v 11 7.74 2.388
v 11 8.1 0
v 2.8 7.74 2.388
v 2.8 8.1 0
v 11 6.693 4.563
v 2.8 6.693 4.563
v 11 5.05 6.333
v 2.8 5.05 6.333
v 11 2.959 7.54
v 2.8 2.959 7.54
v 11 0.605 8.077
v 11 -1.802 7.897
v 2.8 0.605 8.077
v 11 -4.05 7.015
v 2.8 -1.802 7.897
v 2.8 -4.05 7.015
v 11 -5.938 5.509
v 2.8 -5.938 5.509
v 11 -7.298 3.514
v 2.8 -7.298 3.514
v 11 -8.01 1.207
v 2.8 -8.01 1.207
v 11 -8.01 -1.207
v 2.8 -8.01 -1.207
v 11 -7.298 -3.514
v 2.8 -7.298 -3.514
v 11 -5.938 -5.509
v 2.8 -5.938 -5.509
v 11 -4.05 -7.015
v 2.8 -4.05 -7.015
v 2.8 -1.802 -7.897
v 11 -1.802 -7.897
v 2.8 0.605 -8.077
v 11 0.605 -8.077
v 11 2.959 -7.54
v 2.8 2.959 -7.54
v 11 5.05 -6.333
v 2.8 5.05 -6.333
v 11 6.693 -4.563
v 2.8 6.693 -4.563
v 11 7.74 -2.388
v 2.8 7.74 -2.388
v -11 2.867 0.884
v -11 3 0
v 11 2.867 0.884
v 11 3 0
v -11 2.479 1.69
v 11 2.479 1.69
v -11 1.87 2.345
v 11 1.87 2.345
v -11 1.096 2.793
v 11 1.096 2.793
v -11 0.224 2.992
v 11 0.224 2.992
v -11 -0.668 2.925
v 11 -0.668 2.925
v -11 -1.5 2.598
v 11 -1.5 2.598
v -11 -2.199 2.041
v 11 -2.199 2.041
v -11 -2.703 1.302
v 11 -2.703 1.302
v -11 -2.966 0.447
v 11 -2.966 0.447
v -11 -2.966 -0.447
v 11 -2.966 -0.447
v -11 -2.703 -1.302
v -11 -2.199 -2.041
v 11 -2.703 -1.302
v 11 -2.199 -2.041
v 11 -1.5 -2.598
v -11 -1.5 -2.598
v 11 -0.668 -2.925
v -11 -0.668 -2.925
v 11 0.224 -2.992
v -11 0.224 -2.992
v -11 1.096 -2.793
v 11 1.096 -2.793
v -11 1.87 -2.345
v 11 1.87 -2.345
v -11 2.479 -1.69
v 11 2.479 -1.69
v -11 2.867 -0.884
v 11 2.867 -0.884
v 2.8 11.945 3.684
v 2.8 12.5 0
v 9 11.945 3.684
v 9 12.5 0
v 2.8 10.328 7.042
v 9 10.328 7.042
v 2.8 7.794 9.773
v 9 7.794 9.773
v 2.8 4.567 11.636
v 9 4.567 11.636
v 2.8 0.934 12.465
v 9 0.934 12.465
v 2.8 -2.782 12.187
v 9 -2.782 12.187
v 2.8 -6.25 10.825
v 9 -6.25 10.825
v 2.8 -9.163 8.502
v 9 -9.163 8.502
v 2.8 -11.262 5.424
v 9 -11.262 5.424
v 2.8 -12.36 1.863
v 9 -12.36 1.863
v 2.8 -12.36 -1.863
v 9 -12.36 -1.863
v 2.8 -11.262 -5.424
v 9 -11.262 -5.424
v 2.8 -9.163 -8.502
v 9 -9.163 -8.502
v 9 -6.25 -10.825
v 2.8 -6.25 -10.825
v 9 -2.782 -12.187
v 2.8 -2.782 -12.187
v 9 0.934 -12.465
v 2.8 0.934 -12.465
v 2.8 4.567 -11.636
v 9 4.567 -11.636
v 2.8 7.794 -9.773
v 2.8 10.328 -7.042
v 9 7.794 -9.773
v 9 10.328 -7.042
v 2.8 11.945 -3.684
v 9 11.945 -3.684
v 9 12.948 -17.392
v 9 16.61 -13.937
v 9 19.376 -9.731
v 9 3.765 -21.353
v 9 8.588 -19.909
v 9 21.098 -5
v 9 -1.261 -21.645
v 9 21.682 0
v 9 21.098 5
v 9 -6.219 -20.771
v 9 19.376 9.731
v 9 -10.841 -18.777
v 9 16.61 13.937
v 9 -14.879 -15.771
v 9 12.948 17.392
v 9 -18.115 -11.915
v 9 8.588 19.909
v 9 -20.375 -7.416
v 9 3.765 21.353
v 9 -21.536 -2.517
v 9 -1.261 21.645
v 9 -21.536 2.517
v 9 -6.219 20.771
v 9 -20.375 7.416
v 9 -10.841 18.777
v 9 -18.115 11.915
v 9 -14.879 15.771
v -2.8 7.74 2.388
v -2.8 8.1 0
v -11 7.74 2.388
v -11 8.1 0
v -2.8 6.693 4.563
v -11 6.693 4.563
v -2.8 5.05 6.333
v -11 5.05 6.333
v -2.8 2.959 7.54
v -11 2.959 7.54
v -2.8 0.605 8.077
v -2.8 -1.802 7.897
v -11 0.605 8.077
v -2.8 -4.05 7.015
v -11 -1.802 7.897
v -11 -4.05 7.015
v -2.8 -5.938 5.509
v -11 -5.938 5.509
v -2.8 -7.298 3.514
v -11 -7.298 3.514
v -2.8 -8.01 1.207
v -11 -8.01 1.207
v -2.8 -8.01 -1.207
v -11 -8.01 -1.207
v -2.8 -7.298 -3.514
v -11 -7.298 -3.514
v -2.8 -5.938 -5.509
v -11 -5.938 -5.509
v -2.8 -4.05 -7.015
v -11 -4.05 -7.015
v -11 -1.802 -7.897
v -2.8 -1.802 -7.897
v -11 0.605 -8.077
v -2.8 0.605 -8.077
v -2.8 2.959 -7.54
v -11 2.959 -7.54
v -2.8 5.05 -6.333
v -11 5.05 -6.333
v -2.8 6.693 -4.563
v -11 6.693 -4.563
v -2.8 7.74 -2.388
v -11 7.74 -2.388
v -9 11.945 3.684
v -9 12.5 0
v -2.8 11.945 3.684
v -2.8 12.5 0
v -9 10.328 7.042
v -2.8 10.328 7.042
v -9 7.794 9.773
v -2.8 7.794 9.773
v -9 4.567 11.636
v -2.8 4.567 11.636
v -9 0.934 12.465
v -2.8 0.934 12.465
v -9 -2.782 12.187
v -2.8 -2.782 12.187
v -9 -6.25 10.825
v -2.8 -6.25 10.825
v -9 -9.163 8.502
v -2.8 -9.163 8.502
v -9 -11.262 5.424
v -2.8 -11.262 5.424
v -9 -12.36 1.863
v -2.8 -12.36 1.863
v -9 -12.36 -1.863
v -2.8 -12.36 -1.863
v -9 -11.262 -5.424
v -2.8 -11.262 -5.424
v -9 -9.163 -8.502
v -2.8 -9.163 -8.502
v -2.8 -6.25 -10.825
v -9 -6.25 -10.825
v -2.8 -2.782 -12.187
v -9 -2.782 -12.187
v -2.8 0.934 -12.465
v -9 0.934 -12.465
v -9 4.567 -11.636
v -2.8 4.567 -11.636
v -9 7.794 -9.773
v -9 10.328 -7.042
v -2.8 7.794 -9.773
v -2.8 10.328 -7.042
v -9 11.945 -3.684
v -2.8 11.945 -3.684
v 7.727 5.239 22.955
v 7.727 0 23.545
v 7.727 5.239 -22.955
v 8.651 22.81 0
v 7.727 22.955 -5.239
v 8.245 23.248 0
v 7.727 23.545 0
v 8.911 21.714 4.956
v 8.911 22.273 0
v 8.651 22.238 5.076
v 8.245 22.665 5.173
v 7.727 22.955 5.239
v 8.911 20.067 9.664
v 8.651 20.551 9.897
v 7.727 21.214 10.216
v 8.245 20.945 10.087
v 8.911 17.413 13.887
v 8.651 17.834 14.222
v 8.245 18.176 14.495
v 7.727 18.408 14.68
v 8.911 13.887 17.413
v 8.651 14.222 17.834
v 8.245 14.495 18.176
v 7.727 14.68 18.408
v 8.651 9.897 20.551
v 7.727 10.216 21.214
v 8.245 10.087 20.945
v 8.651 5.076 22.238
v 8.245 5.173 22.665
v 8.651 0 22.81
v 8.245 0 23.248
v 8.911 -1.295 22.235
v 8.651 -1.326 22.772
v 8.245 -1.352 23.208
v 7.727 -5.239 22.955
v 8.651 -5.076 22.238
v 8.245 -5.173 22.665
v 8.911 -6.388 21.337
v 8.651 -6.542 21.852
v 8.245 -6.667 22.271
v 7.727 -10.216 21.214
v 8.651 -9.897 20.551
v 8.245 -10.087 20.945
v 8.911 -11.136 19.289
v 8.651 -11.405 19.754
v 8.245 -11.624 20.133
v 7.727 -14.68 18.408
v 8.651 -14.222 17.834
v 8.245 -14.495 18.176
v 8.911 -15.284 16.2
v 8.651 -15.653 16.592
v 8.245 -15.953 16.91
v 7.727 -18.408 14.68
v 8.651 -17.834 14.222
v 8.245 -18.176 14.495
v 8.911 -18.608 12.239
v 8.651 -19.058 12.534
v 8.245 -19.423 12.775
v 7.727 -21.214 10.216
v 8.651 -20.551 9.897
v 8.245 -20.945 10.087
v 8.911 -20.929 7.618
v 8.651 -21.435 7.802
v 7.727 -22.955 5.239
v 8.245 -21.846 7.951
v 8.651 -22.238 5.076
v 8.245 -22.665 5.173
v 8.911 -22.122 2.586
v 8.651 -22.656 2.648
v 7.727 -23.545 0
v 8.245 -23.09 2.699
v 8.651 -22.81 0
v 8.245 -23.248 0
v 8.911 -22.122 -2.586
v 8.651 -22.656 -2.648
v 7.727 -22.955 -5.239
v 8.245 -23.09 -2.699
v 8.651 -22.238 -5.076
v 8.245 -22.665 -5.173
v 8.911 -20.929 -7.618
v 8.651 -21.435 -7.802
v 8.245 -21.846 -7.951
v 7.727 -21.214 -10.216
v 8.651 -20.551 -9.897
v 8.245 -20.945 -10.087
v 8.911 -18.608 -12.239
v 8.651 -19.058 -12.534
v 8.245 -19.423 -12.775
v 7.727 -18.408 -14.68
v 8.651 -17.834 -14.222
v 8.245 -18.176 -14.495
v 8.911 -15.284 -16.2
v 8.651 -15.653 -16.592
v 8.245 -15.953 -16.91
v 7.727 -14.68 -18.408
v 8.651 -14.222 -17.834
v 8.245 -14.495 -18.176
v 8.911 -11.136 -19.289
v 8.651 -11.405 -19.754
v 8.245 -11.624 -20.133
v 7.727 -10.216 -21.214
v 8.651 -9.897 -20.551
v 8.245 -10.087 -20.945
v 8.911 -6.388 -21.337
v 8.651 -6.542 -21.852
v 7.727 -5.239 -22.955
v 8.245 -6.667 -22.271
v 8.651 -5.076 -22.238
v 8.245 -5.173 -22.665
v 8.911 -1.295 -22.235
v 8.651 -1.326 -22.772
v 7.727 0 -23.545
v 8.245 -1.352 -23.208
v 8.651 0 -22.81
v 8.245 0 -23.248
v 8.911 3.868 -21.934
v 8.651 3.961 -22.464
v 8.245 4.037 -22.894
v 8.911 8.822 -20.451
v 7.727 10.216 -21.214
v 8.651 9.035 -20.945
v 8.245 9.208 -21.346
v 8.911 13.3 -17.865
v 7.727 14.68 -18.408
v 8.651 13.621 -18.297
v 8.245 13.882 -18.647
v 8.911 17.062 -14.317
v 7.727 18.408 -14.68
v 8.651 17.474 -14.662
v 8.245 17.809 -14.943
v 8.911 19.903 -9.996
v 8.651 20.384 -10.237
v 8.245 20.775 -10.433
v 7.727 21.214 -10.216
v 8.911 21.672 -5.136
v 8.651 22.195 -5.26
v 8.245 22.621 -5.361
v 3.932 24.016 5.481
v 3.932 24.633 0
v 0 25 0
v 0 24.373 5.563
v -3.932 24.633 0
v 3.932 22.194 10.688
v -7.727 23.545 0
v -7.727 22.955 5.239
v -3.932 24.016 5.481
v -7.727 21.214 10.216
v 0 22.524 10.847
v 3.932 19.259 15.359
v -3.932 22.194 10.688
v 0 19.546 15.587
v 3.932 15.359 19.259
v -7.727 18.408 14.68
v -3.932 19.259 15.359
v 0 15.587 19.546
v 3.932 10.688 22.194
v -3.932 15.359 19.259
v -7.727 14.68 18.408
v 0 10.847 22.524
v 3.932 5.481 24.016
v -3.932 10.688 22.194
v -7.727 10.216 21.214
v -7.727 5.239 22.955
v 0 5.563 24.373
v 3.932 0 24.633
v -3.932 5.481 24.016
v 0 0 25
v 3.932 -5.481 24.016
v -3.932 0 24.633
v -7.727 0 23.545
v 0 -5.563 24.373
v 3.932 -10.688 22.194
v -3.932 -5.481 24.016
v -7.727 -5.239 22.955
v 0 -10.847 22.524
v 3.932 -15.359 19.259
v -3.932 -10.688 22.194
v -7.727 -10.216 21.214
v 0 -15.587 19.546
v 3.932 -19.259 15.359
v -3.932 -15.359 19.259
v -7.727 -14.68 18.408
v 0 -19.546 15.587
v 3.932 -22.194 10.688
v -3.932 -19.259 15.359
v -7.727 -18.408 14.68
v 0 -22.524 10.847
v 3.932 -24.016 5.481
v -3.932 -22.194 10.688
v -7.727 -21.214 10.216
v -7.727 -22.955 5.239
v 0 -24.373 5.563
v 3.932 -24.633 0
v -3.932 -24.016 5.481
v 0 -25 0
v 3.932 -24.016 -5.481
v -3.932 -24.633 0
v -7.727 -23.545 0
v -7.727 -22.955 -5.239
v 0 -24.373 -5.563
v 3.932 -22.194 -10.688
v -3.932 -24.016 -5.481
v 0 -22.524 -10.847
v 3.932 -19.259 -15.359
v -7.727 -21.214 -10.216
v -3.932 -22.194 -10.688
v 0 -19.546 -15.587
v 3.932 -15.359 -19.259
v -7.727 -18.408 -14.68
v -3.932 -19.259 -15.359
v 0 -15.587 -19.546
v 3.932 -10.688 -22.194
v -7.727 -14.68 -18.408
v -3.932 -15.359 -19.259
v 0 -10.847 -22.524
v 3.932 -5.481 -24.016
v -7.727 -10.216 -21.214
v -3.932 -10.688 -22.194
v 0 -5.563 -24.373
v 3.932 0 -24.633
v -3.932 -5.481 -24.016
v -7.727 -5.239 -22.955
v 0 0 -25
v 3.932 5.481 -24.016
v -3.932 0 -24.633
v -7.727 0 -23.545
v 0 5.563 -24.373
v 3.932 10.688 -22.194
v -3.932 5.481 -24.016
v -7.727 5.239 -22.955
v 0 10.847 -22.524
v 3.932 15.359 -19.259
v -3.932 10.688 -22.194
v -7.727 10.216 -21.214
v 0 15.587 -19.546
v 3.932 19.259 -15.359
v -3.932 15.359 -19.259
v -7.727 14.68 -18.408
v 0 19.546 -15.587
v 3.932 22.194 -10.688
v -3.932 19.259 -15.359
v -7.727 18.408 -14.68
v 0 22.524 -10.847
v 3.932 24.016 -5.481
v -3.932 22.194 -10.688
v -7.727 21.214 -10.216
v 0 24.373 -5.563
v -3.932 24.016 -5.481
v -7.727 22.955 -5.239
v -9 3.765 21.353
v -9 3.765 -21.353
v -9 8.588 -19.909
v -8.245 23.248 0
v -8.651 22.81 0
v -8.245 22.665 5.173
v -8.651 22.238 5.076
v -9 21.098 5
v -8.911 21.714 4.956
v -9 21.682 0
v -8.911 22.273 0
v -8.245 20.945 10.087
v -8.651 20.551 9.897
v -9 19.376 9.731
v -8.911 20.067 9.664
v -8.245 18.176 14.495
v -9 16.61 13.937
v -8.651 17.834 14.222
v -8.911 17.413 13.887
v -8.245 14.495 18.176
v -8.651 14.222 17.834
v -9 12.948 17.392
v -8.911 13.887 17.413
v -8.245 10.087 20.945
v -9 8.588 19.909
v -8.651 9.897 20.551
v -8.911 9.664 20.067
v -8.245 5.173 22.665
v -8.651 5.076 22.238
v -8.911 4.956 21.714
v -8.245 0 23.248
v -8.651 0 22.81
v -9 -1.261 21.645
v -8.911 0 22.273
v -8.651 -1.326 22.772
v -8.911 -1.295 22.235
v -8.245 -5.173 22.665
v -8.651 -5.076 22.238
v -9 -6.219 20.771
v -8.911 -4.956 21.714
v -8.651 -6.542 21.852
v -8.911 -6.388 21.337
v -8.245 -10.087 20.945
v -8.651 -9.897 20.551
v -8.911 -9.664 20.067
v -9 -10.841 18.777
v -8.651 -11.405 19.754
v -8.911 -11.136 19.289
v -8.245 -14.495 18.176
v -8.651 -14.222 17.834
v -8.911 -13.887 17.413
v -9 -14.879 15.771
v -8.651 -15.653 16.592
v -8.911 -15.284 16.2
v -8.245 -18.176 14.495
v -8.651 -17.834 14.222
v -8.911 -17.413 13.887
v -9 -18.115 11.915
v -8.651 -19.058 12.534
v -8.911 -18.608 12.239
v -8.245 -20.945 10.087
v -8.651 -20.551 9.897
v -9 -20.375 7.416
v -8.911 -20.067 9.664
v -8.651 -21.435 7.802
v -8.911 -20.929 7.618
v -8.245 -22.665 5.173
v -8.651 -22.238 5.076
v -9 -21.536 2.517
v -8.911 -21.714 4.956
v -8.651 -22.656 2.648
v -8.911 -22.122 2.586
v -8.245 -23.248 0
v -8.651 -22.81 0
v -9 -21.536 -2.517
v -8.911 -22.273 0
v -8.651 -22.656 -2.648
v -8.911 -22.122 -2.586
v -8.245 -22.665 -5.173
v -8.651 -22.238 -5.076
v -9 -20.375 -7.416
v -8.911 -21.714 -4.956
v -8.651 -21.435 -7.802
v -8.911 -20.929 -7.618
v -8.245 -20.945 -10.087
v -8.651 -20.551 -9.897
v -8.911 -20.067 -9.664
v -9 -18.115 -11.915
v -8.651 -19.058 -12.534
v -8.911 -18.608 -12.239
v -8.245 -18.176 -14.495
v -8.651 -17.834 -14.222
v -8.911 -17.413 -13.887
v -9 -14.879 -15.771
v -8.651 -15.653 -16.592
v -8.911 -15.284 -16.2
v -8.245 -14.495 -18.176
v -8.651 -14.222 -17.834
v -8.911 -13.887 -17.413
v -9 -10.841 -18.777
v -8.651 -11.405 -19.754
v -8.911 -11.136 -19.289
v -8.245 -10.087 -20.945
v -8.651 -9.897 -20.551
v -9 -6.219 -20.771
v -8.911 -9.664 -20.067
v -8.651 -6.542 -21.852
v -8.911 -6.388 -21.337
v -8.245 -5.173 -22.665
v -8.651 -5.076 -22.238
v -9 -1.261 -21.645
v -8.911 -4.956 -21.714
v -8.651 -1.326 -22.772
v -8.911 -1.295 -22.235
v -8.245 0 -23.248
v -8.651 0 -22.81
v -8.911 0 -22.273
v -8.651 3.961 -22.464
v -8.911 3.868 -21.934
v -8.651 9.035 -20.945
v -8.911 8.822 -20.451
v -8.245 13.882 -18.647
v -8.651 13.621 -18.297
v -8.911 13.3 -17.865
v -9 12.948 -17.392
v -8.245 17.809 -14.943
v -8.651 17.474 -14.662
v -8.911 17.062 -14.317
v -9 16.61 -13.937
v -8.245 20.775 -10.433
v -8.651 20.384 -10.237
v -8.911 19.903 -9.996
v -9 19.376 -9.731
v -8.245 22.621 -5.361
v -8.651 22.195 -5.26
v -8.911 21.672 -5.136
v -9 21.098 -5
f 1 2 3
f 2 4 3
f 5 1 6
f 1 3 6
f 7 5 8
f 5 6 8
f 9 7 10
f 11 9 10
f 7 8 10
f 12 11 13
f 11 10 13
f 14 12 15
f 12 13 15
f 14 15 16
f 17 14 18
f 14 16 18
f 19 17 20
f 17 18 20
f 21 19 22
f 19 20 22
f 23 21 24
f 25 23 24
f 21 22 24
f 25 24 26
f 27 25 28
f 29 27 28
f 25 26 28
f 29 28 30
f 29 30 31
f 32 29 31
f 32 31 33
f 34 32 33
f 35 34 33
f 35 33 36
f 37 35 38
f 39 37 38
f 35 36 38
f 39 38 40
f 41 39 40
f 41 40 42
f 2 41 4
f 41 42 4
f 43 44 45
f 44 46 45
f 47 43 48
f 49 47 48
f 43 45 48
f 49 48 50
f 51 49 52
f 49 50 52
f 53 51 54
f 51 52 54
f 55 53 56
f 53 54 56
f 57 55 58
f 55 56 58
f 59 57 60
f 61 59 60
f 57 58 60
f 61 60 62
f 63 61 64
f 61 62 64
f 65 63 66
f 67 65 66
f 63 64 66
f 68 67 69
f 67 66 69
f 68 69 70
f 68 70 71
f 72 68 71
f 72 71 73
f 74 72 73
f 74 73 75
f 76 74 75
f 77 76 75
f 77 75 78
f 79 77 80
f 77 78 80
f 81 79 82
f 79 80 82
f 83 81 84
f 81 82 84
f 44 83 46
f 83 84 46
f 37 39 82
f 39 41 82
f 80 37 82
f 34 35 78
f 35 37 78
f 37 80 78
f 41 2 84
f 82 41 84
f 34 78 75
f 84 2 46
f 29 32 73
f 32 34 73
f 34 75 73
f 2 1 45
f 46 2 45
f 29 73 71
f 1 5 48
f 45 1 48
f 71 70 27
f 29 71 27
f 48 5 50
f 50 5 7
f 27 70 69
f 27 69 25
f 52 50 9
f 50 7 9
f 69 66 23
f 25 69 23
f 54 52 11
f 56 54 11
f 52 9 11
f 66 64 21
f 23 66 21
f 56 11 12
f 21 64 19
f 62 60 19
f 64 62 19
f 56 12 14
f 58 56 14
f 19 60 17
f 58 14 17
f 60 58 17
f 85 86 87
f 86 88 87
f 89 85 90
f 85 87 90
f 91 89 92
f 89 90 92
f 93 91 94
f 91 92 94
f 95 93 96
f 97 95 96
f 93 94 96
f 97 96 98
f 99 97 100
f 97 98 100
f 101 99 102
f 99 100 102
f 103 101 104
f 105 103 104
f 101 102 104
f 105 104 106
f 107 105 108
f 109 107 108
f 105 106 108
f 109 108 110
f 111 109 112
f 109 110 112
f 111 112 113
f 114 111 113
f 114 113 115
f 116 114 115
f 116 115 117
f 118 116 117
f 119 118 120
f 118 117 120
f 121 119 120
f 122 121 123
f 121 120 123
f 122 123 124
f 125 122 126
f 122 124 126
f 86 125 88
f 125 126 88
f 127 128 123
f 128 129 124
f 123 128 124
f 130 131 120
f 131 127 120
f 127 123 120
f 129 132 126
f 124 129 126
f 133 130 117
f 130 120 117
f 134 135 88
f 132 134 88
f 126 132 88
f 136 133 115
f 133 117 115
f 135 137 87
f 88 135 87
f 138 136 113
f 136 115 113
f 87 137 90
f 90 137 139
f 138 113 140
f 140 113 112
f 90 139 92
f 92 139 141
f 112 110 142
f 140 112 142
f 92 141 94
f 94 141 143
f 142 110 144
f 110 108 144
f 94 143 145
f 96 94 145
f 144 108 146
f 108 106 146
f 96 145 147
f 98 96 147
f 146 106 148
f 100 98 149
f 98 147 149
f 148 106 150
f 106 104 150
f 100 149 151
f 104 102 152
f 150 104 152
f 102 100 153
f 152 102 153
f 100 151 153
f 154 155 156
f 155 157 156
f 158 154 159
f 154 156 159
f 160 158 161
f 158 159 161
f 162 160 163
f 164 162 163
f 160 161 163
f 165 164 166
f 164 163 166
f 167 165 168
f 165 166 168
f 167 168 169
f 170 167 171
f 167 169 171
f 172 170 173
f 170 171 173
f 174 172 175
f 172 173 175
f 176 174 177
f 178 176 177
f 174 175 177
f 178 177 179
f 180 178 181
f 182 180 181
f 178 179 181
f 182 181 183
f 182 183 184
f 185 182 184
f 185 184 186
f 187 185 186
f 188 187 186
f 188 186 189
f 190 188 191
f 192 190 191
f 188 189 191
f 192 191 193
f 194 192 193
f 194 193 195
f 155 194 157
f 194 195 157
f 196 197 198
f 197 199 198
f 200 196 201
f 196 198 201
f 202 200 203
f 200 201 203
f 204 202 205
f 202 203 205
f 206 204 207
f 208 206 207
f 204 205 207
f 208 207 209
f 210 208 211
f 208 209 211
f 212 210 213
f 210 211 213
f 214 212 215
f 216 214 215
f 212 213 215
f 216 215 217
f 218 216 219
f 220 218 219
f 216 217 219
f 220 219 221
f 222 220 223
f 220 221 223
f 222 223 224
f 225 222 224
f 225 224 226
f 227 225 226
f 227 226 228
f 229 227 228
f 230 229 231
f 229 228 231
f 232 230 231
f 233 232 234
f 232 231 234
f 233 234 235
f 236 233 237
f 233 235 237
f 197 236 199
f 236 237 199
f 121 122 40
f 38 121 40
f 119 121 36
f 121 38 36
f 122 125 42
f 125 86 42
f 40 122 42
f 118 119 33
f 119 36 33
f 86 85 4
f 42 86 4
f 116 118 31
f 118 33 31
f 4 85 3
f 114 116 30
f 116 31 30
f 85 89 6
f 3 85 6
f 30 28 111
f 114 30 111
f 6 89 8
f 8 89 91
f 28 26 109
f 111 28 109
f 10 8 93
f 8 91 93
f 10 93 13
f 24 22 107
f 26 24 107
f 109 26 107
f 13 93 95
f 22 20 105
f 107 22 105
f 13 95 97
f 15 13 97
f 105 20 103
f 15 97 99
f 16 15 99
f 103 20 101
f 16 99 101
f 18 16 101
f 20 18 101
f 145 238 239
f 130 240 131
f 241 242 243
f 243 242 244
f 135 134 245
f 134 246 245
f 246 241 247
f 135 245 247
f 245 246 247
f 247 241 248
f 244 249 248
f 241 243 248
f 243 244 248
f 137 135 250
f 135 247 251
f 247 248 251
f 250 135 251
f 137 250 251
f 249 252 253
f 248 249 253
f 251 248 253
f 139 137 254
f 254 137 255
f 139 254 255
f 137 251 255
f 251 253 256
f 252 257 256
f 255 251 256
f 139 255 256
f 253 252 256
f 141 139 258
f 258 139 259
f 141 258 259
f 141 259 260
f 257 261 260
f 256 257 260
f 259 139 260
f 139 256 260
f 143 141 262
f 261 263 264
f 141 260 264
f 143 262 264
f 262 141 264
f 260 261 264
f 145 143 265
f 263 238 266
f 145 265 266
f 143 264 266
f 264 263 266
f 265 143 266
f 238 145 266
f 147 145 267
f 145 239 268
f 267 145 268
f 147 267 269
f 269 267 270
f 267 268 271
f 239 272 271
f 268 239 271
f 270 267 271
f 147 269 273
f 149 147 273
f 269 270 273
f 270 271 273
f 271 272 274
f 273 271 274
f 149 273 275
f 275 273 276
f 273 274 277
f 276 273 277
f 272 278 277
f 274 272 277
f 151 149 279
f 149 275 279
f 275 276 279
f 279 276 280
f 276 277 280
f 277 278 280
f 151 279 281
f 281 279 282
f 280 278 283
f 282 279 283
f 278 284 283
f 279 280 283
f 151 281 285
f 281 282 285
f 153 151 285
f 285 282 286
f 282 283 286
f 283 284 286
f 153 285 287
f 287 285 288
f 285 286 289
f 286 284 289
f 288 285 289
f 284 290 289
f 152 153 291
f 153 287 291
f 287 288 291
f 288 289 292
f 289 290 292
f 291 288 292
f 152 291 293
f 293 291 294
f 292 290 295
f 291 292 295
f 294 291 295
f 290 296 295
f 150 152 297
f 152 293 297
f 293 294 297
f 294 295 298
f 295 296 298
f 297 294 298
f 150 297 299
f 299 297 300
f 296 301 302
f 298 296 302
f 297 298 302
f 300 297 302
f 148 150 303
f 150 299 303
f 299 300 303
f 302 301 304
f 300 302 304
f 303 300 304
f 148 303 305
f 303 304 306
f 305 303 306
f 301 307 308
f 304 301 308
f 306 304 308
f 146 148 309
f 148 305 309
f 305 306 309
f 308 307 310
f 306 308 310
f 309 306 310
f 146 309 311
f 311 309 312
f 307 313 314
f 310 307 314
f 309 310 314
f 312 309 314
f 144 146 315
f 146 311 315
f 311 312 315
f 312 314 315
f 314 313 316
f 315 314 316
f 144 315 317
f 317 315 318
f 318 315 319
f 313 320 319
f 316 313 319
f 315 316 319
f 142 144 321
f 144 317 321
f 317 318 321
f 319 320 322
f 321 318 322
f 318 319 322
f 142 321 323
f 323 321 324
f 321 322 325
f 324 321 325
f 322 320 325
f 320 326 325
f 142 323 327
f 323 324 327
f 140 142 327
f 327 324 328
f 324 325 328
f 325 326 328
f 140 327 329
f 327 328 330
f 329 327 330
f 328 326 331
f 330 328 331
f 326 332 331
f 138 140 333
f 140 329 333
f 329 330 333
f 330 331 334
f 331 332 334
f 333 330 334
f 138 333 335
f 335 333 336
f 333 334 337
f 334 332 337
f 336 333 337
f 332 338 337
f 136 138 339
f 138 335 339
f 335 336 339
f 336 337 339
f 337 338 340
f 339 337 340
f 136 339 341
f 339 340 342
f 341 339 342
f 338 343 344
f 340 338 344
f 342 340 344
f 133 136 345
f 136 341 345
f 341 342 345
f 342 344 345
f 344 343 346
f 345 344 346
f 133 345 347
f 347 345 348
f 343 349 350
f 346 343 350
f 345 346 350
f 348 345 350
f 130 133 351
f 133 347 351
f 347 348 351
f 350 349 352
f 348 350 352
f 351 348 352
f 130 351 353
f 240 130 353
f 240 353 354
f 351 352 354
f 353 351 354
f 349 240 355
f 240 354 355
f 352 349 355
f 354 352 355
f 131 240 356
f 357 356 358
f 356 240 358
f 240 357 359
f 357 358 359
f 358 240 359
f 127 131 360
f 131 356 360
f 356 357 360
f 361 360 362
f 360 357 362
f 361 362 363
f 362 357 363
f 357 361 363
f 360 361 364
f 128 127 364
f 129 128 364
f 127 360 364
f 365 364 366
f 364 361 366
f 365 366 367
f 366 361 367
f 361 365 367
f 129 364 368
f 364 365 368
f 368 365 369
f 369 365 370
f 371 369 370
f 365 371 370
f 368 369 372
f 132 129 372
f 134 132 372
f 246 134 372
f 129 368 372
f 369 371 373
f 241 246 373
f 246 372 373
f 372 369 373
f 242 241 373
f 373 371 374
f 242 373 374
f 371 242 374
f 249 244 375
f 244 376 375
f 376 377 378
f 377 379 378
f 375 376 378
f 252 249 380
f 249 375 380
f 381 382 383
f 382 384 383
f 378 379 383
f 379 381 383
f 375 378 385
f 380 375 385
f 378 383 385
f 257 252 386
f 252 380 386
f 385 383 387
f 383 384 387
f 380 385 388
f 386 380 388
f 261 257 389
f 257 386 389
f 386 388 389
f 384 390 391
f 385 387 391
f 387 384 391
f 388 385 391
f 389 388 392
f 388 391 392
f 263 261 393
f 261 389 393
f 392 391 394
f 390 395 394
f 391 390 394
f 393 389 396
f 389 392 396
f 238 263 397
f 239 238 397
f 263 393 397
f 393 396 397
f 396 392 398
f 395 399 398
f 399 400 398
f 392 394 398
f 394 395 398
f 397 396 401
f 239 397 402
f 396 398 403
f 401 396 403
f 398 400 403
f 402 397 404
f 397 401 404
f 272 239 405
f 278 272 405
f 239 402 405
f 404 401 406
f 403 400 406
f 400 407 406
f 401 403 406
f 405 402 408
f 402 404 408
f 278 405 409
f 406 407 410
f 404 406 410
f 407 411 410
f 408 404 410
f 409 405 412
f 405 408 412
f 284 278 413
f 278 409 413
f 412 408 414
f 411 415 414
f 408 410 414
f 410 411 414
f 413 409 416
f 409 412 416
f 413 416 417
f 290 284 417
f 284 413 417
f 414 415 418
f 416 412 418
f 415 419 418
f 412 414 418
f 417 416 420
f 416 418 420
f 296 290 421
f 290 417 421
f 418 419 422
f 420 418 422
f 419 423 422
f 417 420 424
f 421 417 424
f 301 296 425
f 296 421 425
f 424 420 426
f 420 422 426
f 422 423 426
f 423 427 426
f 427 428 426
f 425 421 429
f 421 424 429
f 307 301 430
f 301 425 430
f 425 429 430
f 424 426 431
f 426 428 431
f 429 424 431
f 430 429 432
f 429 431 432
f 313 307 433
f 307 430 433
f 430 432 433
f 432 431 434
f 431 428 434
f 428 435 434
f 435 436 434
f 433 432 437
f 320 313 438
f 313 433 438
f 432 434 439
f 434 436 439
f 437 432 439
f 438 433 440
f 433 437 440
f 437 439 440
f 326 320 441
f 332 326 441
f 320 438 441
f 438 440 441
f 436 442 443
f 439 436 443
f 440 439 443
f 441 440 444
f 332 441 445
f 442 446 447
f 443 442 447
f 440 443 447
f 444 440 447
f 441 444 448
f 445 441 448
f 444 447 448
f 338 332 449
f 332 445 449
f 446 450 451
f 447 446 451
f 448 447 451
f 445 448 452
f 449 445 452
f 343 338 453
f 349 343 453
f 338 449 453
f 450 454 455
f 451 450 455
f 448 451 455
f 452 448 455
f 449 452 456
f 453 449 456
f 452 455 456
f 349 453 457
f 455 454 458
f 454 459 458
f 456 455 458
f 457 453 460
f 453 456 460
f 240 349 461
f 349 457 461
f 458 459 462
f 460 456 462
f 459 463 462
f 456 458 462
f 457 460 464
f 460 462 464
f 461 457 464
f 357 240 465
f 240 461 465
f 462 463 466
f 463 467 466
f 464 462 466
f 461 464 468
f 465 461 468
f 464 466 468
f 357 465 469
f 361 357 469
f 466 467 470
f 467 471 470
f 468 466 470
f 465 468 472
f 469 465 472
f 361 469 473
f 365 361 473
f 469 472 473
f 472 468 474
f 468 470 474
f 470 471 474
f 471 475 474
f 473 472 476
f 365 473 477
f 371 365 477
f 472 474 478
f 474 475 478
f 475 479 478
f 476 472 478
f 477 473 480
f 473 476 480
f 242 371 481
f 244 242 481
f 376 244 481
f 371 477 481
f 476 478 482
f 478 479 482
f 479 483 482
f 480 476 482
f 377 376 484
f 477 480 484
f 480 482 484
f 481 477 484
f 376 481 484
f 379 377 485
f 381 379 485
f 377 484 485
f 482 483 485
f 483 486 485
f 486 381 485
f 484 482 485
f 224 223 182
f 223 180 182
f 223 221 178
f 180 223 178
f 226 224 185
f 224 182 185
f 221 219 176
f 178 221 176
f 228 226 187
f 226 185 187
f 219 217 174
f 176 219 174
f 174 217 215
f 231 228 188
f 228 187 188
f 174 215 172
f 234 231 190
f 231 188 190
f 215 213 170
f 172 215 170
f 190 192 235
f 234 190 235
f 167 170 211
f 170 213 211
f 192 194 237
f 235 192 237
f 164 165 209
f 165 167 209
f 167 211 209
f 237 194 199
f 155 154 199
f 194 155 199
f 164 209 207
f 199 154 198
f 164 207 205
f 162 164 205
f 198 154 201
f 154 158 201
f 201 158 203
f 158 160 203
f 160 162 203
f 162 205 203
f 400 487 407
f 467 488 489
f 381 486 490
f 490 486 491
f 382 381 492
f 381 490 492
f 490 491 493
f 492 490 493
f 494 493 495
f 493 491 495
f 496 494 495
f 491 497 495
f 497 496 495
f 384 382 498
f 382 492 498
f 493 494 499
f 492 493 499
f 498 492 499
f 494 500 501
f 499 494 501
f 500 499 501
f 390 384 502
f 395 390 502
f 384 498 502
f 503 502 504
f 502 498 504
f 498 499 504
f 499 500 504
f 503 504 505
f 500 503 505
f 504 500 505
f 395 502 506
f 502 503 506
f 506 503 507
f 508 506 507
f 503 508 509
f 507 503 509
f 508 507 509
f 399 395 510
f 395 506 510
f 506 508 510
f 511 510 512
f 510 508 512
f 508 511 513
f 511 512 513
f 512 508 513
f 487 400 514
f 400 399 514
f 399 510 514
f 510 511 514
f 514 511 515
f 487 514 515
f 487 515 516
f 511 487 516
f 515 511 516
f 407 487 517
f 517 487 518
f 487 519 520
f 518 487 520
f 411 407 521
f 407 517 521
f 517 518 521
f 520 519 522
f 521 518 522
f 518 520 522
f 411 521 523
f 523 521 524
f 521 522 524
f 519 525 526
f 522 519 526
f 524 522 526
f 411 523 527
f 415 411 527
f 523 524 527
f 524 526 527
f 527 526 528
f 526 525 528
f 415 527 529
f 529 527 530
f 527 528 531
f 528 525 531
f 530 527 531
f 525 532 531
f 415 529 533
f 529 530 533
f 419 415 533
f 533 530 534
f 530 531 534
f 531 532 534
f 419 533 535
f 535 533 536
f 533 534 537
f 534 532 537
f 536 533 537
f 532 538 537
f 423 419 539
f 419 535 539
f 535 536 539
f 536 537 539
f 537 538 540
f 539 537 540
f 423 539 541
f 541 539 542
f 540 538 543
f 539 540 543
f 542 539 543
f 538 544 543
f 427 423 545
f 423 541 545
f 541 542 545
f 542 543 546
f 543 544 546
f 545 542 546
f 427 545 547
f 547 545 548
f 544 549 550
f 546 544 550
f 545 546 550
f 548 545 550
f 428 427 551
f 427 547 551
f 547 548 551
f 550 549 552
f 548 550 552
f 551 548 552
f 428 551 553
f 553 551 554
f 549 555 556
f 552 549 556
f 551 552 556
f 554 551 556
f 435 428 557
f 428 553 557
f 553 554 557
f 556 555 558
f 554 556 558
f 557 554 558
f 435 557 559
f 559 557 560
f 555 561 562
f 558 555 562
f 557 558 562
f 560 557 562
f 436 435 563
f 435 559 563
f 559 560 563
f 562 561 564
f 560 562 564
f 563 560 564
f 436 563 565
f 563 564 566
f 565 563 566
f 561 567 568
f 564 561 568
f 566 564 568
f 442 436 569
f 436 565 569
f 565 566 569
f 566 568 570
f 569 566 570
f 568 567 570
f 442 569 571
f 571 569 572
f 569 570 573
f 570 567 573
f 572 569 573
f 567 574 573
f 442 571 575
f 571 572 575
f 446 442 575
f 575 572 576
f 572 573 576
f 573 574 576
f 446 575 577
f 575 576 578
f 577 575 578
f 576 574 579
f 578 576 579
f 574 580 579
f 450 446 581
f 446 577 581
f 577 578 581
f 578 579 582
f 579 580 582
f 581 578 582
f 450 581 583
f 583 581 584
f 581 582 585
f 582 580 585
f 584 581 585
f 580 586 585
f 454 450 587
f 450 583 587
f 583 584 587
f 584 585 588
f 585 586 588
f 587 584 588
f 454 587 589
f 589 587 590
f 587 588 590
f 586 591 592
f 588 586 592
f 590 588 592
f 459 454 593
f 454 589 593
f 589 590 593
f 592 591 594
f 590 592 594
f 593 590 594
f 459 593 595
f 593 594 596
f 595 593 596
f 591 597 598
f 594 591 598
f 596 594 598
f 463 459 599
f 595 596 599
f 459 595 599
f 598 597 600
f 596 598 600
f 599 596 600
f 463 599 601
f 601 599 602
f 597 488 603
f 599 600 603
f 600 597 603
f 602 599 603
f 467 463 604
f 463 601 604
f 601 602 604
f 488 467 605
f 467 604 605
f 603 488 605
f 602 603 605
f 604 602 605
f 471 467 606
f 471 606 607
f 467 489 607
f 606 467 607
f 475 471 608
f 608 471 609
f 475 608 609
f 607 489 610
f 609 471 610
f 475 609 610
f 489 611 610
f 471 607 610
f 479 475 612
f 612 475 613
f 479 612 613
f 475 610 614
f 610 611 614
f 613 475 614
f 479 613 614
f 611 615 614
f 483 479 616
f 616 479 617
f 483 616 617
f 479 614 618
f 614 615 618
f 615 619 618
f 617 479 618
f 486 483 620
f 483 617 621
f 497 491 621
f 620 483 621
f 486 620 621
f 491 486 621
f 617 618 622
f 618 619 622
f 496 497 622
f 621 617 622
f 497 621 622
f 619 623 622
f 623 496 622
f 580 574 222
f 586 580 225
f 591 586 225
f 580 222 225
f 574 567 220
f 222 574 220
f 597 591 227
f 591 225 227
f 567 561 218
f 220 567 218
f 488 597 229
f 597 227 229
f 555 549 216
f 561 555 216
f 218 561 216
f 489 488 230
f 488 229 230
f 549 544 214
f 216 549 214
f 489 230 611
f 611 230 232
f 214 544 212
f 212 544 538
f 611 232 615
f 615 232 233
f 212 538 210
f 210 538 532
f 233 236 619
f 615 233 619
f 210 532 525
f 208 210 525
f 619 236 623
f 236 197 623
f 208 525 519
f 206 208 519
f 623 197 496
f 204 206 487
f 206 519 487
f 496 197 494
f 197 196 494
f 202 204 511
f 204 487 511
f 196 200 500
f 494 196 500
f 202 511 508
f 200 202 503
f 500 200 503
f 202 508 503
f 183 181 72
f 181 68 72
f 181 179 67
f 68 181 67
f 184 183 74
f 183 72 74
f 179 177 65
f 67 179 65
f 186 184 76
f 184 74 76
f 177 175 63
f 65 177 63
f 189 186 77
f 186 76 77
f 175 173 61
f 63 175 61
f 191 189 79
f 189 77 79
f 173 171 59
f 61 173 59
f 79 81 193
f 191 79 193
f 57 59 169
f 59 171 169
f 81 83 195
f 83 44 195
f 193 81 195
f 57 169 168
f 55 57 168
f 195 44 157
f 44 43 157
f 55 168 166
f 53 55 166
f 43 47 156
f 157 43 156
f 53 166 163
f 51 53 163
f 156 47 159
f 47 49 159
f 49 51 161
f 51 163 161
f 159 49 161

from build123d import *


with BuildPart() as part:
    # Esquisse2 → Révolution1 (revolve)
    with BuildSketch(Plane.XY):
        with BuildLine():
            Line((-11, 3), (11, 3))
            Line((11, 3), (11, 8.1))
            Line((11, 8.1), (2.8, 8.1))
            Line((2.8, 8.1), (2.8, 12.5))
            Line((2.8, 12.5), (9, 12.5))
            Line((9, 12.5), (9, 21.68216384))
            ThreePointArc((9, 21.68216384), (8.651445648, 22.81031599), (7.727272727, 23.545245798))
            ThreePointArc((7.727272727, 23.545245798), (0, 25), (-7.727272727, 23.545245798))
            ThreePointArc((-7.727272727, 23.545245798), (-8.651445648, 22.81031599), (-9, 21.68216384))
            Line((-9, 21.68216384), (-9, 12.5))
            Line((-9, 12.5), (-2.8, 12.5))
            Line((-2.8, 12.5), (-2.8, 8.1))
            Line((-2.8, 8.1), (-11, 8.1))
            Line((-11, 8.1), (-11, 3))
        make_face()
    revolve(axis=Axis((-11, 0, 0), (1, 0, 0)))


solid = part.part
